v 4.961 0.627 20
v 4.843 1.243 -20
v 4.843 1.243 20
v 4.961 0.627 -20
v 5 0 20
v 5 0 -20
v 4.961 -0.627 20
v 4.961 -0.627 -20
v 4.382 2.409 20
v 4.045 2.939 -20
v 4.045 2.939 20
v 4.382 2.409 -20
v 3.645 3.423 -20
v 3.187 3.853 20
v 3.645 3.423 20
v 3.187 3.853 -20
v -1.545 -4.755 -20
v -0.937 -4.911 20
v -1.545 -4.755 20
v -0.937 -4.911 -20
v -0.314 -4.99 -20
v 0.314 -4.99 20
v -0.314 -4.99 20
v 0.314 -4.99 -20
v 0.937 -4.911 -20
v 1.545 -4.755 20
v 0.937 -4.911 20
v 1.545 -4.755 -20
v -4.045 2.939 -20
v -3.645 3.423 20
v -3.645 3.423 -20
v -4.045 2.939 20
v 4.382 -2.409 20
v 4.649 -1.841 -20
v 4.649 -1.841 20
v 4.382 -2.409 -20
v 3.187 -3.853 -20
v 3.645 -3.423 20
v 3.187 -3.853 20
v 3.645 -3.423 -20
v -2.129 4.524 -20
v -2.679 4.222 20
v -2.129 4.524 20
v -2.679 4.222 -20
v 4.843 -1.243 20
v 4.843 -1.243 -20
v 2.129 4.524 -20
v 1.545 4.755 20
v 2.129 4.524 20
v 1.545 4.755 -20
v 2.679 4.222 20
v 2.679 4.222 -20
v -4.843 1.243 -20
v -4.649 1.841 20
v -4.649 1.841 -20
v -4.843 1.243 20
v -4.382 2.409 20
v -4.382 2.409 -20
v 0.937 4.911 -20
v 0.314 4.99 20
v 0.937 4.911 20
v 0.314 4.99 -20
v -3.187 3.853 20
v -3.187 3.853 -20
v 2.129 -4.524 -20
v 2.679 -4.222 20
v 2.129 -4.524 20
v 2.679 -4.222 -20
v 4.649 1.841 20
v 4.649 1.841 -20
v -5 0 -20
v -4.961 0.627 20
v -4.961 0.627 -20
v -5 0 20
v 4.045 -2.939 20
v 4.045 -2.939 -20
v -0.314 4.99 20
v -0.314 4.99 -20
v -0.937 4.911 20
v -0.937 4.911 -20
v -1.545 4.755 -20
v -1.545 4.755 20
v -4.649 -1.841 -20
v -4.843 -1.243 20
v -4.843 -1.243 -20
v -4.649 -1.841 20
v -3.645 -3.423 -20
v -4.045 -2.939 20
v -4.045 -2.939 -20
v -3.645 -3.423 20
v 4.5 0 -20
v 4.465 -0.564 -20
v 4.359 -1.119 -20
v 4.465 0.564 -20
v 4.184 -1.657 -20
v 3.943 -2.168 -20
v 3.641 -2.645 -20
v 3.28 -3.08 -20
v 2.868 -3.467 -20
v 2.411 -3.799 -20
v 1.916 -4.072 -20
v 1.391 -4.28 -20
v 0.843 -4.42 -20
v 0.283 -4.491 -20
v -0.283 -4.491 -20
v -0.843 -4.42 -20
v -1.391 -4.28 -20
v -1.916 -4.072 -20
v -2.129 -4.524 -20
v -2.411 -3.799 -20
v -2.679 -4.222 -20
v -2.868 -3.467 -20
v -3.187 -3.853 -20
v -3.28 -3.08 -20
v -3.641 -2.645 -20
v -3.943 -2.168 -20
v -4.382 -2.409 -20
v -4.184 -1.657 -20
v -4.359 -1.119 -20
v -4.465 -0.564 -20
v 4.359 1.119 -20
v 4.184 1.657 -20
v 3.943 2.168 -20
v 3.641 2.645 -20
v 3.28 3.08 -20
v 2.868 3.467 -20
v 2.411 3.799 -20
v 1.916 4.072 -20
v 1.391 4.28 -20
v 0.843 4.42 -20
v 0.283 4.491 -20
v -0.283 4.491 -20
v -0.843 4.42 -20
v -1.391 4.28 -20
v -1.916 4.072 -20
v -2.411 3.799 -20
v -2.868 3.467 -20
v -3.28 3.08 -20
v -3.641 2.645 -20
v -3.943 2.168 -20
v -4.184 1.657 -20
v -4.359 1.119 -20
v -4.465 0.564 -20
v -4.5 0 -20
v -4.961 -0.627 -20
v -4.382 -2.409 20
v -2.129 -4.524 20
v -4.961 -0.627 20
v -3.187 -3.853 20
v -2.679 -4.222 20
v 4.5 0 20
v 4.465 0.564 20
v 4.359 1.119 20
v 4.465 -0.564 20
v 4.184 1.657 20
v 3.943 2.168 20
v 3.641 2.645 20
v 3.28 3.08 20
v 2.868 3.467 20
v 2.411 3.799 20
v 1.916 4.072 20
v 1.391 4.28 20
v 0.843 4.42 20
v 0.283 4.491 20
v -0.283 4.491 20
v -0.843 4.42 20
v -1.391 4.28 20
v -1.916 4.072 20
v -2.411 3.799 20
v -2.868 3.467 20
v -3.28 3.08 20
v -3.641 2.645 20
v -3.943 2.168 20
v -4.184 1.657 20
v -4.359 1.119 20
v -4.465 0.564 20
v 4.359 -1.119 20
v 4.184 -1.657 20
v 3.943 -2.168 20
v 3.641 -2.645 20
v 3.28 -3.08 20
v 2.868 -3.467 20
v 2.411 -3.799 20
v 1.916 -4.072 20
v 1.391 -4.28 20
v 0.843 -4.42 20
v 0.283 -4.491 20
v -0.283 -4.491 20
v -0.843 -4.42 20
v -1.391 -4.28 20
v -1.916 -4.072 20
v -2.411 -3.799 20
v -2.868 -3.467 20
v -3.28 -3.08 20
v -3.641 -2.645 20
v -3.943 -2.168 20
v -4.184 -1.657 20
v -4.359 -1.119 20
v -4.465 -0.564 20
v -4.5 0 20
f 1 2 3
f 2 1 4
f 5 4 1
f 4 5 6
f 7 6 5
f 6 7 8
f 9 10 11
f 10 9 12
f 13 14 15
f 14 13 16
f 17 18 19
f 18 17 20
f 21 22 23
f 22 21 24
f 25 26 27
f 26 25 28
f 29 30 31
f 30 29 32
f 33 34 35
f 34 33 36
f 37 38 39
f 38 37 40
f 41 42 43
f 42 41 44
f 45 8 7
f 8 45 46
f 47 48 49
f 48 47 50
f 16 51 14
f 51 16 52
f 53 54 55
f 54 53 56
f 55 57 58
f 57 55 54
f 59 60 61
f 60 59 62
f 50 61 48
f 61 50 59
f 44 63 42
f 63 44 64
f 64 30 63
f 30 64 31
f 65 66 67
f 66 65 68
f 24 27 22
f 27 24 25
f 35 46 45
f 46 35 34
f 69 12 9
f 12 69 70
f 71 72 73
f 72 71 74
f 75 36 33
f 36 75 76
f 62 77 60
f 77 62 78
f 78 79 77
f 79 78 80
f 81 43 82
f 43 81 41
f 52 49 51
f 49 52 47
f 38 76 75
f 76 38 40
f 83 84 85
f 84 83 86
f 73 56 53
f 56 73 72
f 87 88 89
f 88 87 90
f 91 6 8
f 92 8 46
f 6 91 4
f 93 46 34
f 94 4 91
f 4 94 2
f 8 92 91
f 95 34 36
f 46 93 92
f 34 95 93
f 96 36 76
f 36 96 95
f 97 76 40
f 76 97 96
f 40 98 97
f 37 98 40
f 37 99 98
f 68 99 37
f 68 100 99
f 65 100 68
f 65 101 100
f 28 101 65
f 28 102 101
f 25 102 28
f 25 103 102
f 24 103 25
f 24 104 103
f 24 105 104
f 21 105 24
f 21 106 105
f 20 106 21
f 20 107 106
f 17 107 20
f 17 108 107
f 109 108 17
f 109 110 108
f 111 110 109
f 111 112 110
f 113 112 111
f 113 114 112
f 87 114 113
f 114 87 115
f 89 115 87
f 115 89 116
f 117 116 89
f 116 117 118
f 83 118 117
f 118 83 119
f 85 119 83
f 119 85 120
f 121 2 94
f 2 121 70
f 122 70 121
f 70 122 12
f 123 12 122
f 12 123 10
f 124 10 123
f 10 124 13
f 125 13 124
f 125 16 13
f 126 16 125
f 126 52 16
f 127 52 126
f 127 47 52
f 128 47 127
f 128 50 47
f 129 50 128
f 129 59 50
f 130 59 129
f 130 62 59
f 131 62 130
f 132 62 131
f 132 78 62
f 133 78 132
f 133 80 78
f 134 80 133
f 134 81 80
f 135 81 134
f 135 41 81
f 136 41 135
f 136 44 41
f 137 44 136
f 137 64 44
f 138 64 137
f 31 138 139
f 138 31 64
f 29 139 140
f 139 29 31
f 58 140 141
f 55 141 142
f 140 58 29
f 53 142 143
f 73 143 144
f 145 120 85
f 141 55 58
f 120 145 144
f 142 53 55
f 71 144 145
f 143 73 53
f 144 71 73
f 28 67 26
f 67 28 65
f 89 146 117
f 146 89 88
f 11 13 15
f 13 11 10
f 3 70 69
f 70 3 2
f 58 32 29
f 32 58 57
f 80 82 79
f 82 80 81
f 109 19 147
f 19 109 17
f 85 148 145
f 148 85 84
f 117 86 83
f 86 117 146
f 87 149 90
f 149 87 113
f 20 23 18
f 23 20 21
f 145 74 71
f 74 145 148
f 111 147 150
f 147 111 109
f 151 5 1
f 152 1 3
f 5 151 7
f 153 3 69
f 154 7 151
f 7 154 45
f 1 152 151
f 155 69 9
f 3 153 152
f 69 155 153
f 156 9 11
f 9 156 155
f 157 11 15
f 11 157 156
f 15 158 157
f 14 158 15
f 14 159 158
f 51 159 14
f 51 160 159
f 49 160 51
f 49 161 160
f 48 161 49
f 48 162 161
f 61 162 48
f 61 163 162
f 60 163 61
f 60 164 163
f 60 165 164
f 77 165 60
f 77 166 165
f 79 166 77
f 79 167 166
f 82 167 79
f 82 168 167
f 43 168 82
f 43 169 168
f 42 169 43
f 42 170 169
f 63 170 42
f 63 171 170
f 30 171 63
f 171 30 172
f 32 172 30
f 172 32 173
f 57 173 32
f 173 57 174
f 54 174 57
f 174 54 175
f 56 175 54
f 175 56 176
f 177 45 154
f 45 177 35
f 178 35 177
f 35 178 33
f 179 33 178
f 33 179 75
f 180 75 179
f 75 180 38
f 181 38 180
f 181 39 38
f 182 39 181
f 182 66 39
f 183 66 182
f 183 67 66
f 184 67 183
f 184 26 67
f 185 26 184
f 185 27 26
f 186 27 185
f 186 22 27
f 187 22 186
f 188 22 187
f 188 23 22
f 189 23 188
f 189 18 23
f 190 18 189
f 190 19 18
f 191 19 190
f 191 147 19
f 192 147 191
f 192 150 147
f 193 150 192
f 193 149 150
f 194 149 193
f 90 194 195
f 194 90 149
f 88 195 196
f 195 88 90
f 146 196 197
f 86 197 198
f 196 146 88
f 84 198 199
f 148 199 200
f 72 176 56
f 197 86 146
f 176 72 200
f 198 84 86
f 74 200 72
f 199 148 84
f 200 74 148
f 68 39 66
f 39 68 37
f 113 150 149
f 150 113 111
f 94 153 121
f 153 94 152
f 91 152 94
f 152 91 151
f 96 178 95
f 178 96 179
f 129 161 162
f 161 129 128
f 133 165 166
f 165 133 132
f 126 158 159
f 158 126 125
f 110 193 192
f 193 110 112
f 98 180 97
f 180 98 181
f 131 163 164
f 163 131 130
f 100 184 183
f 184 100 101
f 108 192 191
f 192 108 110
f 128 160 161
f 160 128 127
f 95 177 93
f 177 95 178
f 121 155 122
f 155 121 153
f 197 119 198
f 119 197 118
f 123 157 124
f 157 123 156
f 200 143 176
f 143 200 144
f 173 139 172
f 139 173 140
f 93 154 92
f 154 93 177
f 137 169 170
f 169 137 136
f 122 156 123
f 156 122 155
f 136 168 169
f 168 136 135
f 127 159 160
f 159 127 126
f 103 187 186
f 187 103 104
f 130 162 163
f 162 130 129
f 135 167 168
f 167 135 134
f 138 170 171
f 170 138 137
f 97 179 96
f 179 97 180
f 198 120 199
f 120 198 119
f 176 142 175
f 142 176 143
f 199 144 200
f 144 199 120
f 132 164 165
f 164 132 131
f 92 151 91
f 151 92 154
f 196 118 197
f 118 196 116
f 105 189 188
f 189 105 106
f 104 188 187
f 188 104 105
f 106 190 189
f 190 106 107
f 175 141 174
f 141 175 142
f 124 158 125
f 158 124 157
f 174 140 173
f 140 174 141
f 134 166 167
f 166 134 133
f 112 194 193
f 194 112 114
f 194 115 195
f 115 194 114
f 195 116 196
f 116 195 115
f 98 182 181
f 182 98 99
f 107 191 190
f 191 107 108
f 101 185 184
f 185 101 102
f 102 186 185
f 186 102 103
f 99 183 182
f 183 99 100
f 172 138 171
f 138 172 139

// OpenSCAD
$fn = 50;


difference() {
	union() {
		translate(v = [0, 0, -20.0000000000]) {
			cylinder(h = 40, r = 5.0000000000);
		}
	}
	union() {
		translate(v = [0, 0, -100.0000000000]) {
			cylinder(h = 200, r = 4.5000000000);
		}
	}
}
